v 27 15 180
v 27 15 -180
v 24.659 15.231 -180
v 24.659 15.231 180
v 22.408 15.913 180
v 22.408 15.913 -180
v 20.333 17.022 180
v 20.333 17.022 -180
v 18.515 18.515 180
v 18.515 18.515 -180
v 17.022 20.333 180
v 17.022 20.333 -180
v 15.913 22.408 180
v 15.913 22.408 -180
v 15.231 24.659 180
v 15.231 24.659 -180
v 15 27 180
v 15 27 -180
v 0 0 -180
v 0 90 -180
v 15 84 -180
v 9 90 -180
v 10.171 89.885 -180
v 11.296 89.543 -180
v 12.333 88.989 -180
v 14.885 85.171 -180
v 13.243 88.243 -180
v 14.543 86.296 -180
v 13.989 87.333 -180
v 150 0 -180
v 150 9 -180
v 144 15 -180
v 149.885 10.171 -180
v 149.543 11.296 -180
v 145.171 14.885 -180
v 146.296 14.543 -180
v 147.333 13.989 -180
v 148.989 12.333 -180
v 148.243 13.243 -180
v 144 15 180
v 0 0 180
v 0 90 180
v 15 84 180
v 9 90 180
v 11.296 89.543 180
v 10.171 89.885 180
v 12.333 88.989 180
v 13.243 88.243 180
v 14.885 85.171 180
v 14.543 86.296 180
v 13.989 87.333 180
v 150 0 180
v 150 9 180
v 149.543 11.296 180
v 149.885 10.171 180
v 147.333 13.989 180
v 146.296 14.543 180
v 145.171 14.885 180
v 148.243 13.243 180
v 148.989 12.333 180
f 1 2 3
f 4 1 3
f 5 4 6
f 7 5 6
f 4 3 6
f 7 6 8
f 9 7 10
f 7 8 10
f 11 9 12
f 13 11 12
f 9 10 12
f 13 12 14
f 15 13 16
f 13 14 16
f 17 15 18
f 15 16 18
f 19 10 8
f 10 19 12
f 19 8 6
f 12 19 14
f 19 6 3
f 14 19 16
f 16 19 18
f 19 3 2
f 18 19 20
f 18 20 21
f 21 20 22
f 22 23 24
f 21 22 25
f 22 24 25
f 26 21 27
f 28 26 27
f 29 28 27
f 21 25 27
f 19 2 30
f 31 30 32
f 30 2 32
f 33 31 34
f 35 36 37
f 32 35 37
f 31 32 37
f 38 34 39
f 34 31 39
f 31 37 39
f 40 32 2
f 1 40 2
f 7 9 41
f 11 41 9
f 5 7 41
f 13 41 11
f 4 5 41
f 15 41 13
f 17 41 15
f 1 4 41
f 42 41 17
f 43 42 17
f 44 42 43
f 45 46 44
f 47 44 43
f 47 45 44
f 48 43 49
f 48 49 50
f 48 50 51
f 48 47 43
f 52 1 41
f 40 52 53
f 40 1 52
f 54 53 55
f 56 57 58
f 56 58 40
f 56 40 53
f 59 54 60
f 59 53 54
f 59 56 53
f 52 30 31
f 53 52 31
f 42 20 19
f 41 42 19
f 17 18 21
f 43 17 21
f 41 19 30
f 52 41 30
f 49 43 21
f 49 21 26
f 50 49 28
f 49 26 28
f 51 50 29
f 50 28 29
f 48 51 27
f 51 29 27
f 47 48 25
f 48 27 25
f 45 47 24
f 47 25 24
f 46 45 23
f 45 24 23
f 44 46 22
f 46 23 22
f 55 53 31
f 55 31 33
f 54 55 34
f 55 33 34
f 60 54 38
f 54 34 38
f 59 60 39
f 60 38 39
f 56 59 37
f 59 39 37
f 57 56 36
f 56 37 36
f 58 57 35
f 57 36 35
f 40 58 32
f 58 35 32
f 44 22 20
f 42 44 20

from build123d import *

# Parameters (mm, degrees)
EA_RSA40X40X5_1_DEPTH = 360


with BuildPart() as part:
    # Sketch1 → Ea RSA40X40X5(1) (new body)
    with BuildSketch(Plane.XY.offset(-180)):
        with BuildLine():
            Line((0, 90), (0, 0))
            Line((0, 0), (150, 0))
            Line((150, 0), (150, 9))
            ThreePointArc((150, 9), (148.242640687, 13.242640687), (144, 15))
            Line((144, 15), (27, 15))
            ThreePointArc((27, 15), (18.514718626, 18.514718626), (15, 27))
            Line((15, 27), (15, 84))
            ThreePointArc((15, 84), (13.242640687, 88.242640687), (9, 90))
            Line((9, 90), (0, 90))
        make_face()
    extrude(amount=EA_RSA40X40X5_1_DEPTH)


solid = part.part
